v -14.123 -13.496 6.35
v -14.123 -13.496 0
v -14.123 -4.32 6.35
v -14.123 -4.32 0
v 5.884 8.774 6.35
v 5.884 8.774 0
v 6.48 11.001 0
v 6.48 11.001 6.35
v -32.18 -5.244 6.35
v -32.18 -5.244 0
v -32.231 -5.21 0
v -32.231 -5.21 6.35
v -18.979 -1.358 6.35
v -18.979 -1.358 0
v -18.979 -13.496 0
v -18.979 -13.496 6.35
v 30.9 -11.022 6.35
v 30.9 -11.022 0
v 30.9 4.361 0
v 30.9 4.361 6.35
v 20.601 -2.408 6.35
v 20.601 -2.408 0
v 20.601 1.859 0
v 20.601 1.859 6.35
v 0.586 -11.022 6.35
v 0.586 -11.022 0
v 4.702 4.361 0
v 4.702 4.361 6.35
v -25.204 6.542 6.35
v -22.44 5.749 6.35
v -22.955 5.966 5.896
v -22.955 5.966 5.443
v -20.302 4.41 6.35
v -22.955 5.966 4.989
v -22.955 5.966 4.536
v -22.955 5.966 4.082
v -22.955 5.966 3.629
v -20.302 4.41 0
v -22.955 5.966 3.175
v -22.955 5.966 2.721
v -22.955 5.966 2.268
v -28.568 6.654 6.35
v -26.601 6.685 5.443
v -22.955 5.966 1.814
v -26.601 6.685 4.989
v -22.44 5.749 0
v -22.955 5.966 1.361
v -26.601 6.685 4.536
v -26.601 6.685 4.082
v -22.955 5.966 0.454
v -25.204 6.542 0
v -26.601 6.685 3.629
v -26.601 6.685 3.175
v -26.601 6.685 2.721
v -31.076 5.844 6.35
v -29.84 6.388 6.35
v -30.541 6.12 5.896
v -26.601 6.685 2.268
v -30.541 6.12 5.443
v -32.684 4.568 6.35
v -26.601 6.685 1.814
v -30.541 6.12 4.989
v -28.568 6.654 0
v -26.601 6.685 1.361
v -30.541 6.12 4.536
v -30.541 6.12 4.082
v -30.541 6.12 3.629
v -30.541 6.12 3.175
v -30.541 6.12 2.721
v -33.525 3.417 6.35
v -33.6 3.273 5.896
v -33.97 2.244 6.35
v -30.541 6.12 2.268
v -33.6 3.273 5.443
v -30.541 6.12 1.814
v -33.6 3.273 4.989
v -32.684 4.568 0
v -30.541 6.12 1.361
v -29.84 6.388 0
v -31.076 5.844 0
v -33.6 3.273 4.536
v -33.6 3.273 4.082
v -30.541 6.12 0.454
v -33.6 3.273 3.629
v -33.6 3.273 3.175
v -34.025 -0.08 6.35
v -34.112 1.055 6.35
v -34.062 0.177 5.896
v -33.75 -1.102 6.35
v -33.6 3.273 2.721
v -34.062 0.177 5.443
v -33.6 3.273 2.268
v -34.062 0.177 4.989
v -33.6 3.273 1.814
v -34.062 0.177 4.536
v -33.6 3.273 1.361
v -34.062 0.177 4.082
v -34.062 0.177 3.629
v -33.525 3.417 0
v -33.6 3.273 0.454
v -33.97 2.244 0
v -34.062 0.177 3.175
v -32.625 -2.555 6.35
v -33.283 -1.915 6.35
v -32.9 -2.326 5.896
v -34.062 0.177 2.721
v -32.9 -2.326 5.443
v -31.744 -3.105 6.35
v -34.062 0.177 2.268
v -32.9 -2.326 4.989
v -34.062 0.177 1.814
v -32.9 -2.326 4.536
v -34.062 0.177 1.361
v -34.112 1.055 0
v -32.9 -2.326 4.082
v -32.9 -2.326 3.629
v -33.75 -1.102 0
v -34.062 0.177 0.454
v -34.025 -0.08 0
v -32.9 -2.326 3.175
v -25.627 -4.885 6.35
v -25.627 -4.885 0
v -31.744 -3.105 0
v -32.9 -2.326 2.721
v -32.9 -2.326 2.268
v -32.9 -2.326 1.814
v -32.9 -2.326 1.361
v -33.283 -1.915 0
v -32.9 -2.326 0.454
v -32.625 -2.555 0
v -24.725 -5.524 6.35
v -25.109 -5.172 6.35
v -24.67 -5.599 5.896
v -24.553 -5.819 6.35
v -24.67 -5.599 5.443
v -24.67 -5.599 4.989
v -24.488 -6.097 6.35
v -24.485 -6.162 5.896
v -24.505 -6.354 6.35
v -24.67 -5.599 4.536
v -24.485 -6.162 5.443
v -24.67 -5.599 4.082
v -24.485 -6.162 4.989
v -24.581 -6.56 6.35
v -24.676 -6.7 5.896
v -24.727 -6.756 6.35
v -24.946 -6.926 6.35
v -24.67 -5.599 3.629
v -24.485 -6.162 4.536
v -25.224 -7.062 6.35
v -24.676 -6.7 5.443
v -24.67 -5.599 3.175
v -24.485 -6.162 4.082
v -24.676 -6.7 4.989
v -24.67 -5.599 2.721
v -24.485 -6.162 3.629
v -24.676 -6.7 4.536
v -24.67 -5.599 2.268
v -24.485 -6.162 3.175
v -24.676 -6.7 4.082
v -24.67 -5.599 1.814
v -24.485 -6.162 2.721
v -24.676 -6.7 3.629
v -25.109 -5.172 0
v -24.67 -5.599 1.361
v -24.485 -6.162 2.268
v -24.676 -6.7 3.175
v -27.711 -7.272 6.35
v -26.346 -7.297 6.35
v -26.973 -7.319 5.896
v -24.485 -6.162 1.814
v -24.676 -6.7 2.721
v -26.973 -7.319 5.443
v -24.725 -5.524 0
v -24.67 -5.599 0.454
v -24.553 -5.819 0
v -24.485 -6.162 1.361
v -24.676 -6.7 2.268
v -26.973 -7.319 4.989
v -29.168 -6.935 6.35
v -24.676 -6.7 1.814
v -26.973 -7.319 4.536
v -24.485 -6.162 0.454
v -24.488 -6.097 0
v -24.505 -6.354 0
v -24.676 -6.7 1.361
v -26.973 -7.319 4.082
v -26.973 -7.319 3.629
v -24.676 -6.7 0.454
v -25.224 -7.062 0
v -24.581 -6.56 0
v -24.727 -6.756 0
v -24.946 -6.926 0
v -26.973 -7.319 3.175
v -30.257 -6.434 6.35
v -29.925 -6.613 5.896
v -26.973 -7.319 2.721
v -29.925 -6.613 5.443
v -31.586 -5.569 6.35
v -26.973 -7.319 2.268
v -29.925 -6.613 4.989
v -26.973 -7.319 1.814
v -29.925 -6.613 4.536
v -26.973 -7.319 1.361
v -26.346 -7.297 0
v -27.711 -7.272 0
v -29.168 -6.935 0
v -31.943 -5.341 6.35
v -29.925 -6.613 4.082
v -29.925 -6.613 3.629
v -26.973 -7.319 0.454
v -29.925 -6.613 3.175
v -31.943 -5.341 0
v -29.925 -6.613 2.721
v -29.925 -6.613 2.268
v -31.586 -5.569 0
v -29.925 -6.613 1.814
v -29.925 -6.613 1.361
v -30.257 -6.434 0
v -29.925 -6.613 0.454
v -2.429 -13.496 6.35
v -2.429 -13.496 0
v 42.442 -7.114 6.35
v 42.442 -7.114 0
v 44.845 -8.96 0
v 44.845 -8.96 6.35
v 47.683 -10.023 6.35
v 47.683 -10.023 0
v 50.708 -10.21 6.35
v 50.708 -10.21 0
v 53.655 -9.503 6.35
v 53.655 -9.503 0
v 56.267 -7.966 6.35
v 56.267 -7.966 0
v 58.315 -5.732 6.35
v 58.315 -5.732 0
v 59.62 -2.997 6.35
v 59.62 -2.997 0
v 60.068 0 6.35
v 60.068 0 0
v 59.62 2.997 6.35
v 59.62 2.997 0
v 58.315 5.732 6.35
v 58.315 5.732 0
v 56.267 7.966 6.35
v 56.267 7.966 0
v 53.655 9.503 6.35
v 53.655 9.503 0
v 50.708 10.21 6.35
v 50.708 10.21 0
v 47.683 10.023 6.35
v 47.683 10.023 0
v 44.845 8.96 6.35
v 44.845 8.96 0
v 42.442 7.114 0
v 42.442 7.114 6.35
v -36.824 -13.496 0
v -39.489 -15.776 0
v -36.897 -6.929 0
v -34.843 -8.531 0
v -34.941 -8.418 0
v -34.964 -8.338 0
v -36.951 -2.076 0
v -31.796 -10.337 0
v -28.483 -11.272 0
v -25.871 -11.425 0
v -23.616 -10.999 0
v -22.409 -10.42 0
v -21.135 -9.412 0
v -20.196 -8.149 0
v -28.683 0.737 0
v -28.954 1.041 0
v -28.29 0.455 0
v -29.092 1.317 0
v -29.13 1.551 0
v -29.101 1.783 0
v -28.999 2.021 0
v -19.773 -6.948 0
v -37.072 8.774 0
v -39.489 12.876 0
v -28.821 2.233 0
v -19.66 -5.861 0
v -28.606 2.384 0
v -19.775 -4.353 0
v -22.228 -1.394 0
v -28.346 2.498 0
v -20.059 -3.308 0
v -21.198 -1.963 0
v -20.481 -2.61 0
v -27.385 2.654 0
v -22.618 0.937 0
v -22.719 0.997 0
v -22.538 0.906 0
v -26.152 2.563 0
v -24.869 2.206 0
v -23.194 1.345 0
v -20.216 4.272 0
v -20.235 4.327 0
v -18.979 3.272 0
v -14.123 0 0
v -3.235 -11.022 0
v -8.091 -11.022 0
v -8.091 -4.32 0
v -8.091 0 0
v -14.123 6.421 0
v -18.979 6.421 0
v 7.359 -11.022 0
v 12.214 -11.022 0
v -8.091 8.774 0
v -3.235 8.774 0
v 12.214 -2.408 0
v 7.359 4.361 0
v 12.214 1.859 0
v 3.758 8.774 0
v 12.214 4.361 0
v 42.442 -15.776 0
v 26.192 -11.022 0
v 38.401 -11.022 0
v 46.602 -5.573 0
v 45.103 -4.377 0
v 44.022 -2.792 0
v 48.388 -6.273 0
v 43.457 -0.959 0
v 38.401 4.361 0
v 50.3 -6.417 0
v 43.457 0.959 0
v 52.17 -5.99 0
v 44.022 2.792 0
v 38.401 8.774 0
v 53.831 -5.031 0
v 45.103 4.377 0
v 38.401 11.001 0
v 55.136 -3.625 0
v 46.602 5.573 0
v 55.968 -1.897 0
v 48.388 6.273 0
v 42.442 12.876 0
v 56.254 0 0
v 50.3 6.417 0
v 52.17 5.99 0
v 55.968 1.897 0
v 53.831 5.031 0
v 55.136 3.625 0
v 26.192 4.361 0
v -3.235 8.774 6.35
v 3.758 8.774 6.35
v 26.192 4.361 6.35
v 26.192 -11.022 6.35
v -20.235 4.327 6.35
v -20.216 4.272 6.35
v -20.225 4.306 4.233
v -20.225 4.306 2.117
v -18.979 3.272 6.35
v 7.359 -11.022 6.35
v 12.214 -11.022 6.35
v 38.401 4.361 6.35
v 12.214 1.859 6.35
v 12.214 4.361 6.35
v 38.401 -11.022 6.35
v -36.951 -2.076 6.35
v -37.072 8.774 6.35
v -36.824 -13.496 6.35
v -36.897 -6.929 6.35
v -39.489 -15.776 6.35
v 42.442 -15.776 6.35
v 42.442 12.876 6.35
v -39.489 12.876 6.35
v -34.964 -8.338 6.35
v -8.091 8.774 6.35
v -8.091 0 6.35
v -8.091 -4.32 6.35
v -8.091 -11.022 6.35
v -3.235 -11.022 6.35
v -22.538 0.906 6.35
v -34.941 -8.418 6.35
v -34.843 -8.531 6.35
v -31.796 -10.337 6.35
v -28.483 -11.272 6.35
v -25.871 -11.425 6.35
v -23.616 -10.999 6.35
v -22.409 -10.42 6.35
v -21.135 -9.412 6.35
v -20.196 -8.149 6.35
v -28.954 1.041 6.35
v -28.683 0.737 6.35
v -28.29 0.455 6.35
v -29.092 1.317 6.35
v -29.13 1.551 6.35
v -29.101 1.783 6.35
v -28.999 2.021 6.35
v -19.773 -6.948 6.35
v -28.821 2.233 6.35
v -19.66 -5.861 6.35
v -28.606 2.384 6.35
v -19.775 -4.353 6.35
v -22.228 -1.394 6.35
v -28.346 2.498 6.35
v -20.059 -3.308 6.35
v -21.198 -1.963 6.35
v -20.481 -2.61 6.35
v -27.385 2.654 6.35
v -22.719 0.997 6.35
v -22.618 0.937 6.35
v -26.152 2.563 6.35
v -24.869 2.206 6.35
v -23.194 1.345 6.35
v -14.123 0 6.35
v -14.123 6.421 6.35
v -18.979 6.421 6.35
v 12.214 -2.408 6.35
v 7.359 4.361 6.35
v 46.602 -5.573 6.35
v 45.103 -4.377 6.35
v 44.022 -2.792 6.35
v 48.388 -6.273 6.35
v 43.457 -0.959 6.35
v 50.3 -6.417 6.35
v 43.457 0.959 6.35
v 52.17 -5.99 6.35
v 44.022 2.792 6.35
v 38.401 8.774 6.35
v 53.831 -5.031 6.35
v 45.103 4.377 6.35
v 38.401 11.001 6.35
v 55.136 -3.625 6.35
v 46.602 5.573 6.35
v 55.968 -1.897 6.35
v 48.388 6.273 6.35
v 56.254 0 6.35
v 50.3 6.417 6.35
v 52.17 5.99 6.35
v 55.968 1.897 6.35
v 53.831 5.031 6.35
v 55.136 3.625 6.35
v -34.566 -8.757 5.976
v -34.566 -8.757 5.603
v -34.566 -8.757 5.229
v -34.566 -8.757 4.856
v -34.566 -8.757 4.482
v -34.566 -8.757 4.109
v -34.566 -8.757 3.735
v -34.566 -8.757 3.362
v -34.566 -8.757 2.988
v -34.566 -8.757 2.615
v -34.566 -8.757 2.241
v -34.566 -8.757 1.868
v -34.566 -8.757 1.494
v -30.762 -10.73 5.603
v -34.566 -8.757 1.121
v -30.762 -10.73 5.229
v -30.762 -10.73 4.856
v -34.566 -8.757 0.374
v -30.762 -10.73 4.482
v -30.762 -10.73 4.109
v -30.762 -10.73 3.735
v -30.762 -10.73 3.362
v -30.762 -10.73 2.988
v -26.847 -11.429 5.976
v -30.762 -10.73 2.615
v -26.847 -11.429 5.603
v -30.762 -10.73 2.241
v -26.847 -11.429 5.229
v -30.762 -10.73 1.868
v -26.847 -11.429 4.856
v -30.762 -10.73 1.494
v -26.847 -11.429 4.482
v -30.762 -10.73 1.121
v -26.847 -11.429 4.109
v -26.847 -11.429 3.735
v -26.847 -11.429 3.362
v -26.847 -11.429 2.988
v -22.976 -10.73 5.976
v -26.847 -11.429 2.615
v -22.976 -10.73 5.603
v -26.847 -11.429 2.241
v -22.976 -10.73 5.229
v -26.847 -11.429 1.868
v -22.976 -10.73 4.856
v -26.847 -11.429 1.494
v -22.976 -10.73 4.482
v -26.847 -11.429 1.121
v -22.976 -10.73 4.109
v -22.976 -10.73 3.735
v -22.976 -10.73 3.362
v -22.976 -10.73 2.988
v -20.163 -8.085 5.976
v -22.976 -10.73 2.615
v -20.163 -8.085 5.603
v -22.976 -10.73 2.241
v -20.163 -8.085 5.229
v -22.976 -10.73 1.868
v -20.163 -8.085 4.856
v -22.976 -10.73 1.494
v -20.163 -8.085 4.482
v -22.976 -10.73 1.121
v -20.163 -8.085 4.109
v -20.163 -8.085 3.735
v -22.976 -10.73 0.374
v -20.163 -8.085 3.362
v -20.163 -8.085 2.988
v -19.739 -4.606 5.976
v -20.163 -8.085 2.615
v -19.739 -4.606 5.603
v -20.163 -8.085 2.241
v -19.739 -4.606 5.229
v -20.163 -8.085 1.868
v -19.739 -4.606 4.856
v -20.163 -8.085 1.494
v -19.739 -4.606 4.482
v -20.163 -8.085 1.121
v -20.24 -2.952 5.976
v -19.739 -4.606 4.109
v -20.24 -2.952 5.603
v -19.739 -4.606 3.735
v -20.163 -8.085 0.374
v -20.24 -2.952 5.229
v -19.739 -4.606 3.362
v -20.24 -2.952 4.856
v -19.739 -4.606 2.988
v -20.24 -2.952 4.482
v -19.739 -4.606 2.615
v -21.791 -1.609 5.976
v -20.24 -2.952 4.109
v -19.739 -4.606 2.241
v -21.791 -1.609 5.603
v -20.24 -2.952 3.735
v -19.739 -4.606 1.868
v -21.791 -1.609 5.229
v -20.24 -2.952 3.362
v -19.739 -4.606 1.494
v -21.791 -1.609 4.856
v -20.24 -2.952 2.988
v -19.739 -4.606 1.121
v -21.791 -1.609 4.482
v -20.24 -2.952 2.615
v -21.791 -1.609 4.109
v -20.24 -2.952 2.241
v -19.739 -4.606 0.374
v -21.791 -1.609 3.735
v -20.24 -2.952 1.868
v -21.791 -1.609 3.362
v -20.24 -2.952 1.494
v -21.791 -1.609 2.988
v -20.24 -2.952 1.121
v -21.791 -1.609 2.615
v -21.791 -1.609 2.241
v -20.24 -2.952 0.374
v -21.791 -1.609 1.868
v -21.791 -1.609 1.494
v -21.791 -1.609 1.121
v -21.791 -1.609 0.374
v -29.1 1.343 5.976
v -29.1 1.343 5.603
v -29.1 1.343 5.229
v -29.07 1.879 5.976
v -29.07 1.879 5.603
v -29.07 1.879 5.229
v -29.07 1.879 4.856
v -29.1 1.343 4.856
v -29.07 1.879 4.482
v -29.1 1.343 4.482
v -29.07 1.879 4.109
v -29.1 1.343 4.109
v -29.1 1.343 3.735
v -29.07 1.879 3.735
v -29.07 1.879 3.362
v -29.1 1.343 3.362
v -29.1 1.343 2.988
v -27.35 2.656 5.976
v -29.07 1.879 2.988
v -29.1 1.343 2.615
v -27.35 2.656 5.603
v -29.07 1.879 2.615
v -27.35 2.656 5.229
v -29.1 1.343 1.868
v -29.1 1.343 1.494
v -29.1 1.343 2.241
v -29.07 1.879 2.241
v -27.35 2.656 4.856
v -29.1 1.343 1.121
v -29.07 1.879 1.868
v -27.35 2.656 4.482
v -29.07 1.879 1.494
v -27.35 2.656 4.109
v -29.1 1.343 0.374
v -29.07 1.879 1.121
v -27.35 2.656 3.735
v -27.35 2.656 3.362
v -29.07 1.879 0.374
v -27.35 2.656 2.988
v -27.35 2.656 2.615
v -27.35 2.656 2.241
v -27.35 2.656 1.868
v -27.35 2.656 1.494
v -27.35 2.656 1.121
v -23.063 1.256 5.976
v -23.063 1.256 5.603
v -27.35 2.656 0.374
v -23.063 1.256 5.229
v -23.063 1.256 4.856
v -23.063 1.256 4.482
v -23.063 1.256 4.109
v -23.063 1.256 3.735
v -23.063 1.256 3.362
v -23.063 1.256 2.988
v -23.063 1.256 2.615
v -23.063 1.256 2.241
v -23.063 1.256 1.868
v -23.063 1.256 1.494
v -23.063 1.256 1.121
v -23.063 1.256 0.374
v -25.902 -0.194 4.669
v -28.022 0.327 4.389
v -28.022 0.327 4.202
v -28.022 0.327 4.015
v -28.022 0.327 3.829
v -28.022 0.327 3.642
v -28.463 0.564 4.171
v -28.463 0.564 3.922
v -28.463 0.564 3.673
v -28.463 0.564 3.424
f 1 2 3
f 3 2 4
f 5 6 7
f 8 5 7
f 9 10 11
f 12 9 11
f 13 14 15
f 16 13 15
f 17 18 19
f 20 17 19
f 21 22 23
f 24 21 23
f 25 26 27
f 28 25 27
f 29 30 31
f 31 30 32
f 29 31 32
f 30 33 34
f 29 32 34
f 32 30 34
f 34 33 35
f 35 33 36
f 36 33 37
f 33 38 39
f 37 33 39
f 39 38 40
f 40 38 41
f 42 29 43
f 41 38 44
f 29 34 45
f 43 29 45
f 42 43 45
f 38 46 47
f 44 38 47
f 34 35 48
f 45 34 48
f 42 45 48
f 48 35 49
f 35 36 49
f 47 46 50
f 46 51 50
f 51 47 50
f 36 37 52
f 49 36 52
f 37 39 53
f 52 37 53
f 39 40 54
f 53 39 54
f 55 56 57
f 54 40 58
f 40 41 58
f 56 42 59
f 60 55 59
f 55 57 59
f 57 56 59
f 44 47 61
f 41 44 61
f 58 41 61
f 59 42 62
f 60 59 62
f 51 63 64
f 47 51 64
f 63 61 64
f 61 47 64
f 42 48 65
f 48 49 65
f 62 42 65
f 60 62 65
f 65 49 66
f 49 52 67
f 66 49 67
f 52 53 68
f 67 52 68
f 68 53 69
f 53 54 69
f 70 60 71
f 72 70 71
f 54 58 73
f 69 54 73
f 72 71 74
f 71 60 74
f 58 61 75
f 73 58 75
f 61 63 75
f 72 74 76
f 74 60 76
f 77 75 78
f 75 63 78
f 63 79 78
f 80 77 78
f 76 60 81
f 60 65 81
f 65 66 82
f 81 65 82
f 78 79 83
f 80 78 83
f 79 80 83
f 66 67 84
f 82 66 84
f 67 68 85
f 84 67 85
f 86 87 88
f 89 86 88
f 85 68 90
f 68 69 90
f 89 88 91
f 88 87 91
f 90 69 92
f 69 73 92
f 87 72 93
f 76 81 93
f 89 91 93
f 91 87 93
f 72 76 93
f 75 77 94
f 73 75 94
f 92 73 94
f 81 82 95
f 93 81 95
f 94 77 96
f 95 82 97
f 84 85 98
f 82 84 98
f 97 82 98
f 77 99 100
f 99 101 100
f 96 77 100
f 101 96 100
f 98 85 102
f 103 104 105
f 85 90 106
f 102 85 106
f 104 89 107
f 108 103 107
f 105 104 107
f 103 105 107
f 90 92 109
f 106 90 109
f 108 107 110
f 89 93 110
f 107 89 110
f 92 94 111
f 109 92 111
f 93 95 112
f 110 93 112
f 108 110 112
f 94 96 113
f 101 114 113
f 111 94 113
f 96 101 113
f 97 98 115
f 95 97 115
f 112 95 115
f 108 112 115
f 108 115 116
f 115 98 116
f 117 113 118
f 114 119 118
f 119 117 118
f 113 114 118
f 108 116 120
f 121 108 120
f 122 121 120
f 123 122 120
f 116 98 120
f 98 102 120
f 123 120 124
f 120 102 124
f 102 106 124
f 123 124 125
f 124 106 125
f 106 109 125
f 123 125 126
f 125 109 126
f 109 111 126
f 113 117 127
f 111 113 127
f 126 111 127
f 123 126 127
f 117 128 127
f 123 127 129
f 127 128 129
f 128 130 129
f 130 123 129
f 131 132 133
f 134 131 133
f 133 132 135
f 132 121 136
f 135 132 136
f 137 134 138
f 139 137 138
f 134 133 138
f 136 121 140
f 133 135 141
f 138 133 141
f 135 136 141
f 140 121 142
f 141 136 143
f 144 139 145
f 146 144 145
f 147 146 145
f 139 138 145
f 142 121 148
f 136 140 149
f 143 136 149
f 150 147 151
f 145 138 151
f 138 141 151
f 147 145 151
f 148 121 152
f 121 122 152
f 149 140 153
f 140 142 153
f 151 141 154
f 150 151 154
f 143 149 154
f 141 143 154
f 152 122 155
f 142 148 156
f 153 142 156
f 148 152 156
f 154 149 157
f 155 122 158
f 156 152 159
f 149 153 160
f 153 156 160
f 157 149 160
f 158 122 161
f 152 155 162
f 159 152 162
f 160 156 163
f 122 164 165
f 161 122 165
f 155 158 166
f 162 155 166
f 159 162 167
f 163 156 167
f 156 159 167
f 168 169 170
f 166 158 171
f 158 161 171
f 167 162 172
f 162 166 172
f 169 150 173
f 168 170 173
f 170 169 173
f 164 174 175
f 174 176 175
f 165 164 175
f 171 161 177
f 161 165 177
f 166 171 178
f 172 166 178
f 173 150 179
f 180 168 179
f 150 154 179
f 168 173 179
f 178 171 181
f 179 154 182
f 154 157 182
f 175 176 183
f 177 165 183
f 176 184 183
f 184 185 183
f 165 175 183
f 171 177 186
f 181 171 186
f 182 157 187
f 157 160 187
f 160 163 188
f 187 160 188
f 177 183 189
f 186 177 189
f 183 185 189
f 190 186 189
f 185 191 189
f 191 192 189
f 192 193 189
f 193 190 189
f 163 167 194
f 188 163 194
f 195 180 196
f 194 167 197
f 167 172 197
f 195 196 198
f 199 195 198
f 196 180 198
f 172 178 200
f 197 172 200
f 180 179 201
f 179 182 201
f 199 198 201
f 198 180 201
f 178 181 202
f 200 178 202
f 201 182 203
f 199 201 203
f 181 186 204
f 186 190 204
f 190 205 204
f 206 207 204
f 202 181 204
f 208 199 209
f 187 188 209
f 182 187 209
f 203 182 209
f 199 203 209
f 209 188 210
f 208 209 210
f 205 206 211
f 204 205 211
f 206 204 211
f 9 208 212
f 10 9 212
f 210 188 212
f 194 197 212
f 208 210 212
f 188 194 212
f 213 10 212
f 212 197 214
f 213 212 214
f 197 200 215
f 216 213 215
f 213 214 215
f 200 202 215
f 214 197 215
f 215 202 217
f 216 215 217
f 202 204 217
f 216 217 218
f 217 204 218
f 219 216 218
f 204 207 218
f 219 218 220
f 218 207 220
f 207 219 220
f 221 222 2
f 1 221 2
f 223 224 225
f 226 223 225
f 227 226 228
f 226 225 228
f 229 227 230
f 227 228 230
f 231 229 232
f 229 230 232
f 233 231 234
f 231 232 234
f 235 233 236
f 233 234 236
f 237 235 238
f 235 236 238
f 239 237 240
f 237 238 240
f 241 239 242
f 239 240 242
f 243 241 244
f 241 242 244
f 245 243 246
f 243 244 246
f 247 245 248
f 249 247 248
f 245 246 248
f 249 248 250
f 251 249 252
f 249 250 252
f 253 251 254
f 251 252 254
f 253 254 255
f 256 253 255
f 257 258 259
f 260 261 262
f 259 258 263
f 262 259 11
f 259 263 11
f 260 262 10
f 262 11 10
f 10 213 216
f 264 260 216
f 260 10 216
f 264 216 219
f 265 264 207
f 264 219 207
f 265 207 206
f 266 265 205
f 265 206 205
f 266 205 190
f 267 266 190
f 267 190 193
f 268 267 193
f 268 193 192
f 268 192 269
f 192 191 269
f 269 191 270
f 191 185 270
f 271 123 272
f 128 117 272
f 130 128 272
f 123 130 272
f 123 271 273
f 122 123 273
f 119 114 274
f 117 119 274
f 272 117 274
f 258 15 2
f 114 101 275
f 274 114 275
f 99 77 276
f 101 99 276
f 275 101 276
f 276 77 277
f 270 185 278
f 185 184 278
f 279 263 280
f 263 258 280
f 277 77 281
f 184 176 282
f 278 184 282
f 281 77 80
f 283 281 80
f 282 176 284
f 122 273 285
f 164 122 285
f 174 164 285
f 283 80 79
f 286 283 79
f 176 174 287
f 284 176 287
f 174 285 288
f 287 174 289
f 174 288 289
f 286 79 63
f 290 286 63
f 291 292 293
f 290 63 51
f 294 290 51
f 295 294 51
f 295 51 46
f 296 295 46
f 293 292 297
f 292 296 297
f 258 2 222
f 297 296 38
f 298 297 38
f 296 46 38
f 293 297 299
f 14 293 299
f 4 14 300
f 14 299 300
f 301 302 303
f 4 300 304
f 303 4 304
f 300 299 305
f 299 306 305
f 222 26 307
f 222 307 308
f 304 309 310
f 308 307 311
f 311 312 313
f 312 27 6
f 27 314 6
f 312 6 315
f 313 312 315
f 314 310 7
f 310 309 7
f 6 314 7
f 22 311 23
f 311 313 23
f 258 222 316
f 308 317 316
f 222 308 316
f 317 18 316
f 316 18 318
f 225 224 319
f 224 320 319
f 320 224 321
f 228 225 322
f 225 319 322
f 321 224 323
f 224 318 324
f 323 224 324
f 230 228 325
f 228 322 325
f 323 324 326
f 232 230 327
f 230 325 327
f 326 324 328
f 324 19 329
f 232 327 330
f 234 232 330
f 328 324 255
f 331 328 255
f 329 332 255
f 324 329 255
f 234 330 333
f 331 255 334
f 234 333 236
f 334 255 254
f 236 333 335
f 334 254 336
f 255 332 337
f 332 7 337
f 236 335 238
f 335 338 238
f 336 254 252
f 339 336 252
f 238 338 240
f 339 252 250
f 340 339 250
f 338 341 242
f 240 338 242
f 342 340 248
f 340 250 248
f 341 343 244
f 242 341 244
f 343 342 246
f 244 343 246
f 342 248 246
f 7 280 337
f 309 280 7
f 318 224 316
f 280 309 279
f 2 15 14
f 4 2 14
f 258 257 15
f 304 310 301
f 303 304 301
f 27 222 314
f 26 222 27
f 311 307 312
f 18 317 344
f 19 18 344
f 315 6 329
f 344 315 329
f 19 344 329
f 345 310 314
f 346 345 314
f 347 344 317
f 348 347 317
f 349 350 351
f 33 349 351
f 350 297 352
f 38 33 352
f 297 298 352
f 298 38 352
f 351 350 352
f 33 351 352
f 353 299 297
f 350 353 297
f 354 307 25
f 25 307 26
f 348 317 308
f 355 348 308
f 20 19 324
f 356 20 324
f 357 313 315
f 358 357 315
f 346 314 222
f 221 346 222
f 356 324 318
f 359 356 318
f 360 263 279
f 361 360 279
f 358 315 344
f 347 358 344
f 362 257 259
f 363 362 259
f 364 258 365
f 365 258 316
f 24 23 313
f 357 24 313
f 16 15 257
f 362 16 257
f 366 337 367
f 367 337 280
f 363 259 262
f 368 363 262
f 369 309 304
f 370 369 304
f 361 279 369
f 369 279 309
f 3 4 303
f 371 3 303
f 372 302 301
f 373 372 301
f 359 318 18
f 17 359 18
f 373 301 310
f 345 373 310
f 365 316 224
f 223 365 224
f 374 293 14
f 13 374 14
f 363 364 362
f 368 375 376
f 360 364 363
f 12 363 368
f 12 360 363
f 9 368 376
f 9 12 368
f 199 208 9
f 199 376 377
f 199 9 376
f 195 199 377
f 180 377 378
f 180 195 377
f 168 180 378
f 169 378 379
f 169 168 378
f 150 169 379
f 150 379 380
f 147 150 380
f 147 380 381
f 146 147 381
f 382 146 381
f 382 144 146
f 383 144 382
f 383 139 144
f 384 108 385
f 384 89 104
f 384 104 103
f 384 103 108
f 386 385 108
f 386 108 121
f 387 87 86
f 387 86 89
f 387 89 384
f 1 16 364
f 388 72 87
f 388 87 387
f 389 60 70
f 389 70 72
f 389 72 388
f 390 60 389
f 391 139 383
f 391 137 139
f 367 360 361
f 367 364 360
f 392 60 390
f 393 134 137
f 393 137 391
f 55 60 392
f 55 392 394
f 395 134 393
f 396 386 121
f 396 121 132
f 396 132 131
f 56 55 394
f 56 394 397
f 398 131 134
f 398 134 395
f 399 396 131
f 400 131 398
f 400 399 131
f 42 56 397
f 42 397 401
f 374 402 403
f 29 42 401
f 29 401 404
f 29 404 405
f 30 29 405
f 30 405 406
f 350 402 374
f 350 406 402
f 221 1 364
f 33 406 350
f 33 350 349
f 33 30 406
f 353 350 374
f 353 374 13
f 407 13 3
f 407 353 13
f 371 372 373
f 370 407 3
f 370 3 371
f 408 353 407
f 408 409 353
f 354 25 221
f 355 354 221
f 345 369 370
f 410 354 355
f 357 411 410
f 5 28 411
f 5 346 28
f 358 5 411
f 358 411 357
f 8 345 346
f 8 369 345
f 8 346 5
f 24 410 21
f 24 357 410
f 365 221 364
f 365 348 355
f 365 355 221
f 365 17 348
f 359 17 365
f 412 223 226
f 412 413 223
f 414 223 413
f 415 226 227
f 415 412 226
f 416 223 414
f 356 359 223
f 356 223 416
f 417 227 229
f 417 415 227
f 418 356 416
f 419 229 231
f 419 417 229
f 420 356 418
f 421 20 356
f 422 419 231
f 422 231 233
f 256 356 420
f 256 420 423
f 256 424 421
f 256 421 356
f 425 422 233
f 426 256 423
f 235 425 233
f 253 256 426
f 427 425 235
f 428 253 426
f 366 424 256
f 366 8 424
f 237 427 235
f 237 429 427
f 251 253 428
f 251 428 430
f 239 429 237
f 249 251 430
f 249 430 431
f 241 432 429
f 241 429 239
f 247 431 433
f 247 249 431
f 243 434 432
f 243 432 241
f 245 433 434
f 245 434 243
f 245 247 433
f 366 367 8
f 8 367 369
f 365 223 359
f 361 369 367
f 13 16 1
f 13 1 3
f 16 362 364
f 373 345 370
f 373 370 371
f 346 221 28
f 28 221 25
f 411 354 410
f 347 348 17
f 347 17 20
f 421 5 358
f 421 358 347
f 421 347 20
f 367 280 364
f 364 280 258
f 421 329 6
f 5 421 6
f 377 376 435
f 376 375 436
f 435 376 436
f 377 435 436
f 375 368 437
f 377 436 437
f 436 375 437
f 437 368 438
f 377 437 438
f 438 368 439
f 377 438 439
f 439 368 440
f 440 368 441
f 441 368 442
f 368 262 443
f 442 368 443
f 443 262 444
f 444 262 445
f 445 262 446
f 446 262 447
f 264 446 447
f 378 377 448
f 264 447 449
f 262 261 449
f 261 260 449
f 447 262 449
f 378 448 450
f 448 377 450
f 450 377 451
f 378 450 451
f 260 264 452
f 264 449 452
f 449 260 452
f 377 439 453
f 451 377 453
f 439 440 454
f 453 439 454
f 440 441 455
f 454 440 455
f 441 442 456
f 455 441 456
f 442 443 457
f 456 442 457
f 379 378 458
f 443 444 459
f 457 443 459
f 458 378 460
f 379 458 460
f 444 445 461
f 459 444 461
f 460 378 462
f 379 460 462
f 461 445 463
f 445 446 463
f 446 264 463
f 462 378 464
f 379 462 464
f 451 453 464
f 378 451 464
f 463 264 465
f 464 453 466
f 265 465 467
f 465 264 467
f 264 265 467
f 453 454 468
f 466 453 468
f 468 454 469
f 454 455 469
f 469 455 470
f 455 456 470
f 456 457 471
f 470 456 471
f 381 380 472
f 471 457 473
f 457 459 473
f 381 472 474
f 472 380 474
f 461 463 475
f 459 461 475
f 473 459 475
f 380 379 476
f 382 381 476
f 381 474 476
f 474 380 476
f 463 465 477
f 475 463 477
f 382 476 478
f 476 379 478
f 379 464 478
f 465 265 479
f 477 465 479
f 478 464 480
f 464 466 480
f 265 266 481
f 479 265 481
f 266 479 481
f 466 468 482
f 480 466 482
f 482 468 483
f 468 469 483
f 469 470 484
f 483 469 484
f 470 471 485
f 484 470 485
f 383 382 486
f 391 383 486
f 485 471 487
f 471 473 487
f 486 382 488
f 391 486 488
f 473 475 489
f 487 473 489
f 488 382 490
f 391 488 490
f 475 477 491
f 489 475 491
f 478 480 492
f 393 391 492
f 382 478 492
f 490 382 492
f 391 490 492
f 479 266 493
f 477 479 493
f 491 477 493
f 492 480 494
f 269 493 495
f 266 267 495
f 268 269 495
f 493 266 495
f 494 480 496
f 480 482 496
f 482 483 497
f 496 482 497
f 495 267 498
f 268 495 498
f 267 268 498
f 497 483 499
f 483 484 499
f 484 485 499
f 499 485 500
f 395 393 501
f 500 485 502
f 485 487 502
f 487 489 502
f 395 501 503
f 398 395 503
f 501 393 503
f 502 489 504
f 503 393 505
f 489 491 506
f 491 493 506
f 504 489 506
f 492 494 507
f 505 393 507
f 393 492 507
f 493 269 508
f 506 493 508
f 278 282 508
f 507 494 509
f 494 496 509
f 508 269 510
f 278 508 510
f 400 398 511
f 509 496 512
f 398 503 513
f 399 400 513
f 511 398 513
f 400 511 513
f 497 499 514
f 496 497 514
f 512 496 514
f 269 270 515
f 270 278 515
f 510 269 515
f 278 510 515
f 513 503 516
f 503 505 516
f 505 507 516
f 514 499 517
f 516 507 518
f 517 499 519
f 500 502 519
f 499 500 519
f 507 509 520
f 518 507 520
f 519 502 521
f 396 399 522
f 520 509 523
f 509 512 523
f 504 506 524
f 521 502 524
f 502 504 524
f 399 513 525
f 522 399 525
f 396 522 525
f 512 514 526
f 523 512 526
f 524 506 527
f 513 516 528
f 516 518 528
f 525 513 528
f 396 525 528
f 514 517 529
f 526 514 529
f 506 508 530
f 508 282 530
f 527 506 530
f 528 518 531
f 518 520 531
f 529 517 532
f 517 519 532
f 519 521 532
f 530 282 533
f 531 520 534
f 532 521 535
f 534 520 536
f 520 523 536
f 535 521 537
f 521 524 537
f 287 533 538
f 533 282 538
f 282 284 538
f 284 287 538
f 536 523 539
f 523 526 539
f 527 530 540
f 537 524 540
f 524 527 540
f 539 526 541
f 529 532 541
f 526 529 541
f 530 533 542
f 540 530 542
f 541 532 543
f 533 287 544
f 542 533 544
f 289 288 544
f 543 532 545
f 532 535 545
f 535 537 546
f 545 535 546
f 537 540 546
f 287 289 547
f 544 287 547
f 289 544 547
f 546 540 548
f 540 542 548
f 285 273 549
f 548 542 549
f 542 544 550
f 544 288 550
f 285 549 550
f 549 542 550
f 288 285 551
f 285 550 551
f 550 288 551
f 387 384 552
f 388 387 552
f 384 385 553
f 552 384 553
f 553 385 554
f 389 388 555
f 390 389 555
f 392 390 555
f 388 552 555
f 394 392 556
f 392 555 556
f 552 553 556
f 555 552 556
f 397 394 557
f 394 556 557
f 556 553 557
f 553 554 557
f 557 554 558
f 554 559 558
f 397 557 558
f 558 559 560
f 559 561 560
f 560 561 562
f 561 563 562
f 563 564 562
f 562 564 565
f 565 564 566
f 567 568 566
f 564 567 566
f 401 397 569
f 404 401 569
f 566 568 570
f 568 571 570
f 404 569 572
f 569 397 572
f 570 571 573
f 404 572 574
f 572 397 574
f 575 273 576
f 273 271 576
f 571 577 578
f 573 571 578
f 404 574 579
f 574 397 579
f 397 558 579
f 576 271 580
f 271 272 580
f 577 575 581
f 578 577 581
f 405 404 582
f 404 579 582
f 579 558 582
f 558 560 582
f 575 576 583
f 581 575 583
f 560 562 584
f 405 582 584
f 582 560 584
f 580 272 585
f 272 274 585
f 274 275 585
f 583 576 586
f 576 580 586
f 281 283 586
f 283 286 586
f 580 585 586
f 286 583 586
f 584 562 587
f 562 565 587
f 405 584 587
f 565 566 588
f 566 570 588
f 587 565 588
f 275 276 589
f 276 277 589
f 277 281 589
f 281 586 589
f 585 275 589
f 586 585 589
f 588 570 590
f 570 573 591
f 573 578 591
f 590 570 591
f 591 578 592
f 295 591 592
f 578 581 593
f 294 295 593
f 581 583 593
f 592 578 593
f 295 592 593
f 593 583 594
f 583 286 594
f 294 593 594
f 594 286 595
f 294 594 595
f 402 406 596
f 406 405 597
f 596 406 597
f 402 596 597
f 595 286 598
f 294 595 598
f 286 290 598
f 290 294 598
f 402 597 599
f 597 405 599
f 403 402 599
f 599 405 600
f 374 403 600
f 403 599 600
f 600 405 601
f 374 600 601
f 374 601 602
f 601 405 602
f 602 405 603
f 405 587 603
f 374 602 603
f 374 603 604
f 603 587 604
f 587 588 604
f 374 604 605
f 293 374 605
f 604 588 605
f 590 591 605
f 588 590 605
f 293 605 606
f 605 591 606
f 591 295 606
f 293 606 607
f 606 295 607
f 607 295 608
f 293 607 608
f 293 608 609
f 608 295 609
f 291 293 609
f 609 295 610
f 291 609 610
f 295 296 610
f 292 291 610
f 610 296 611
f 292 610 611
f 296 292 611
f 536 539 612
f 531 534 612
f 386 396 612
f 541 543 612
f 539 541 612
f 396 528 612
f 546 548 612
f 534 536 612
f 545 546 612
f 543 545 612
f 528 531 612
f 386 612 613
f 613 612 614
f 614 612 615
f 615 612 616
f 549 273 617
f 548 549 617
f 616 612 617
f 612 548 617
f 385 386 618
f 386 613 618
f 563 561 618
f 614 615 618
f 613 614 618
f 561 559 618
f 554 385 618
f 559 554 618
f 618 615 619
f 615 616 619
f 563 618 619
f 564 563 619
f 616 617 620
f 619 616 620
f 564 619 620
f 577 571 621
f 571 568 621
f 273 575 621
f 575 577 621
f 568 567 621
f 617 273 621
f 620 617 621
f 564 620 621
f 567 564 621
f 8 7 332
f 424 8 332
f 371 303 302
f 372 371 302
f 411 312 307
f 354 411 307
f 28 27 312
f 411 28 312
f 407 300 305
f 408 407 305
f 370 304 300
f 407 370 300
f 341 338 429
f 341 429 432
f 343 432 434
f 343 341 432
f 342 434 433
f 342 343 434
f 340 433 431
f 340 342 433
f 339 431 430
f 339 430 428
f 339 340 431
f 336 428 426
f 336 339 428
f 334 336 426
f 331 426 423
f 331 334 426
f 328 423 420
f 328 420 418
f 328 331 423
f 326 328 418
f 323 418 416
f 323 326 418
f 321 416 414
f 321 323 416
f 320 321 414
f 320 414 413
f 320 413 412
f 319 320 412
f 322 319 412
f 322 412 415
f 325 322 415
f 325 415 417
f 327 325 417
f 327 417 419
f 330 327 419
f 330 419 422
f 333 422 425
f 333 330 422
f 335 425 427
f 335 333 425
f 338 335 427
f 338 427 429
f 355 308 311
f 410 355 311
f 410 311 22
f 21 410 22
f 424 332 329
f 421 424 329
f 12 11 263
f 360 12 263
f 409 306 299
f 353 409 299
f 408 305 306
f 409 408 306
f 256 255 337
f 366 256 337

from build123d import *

# Parameters (mm, degrees)
F0_R     = 6.4346653904
F1_DEPTH = 6.35


with BuildPart() as f1:
    # F0 (on Top) → F1 (new body)
    with BuildSketch(Plane.XY):
        with BuildLine():
            Line((42.4421280622, 12.8763979301), (39.4888482988, 12.8763979301))
            Line((39.4888482988, 12.8763979301), (-39.4888482988, 12.8763979301))
            Line((-39.4888482988, 12.8763979301), (-39.4888482988, -12.8763979301))
            Line((-39.4888482988, -12.8763979301), (-39.4888482988, -15.7759096473))
            Line((-39.4888482988, -15.7759096473), (42.4421280622, -15.7759096473))
            Line((42.4421280622, -15.7759096473), (42.4421280622, -7.1135064169))
            ThreePointArc((42.4421280622, -7.1135064169), (60.0677187775, 0), (42.4421280622, 7.1135064169))
            Line((42.4421280622, 7.1135064169), (42.4421280622, 12.8763979301))
        make_face()
        with BuildLine():
            Line((-36.9513516024, -2.0756540524), (-37.0719090537, 8.7742841496))
            Line((-37.0719090537, 8.7742841496), (-8.0906844199, 8.7742841496))
            Line((-8.0906844199, 8.7742841496), (-8.0906844199, 6.4205448143))
            Line((-8.0906844199, 6.4205448143), (-8.0906844199, 0))
            Line((-8.0906844199, 0), (-14.1232470879, 0))
            Line((-14.1232470879, 0), (-14.1232470879, 6.4205448143))
            Line((-14.1232470879, 6.4205448143), (-18.9787298441, 6.4205448143))
            Line((-18.9787298441, 6.4205448143), (-18.9787298441, 3.272225149))
            Line((-18.9787298441, 3.272225149), (-20.2155560255, 4.2724418454))
            add(Edge.make_bspline(
                [(-22.5384198129, 0.9058159776), (-22.5087632242, 0.9012403563), (-22.4564231627, 1.003636113), (-20.2998909345, 4.1680794182), (-20.2137324503, 4.2468094283), (-20.2155560255, 4.2724418454)],
                knots=[0.9408554446, 0.9408554446, 0.9408554446, 0.9408554446, 0.9475987771, 0.9851160131, 0.9922654541, 0.9922654541, 0.9922654541, 0.9922654541], degree=3))
            Line((-22.5384198129, 0.9058159776), (-18.9787298441, -1.3575867051))
            Line((-18.9787298441, -1.3575867051), (-18.9787298441, -11.0218683258))
            Line((-18.9787298441, -11.0218683258), (-18.9787298441, -13.4963878203))
            Line((-18.9787298441, -13.4963878203), (-36.8244518423, -13.4963878203))
            Line((-36.8244518423, -13.4963878203), (-36.8974223987, -6.9291784173))
            Line((-36.8974223987, -6.9291784173), (-34.963618964, -8.3375107497))
            add(Edge.make_bspline(
                [(-32.2309853918, -5.2103603082), (-32.2342536022, -5.2109736525), (-32.5026233072, -5.2870456733), (-34.8780387985, -8.3306569491), (-34.9598781788, -8.3231927663), (-34.963618964, -8.3375107497)],
                knots=[0.4355467782, 0.4355467782, 0.4355467782, 0.4355467782, 0.4360630295, 0.4746738617, 0.4803443093, 0.4803443093, 0.4803443093, 0.4803443093], degree=3))
            Line((-32.2309853918, -5.2103603082), (-36.9513516024, -2.0756540524))
        make_face(mode=Mode.SUBTRACT)
        Polygon((-3.2352029779, 8.7742841496), (3.757656788, 8.7742841496), (-2.4286360377, -13.4963878203), (-14.1232470879, -13.4963878203), (-14.1232470879, -11.0218693809), (-14.1232470879, -4.3203692259), (-8.0906844199, -4.3203692259), (-8.0906844199, -11.0218693809), (-3.2352029779, -11.0218693809), (-3.2352029779, 6.4205437592), align=None, mode=Mode.SUBTRACT)
        Polygon((7.3585736133, -11.0218693809), (0.585847945, -11.0218693809), (4.7024635713, 4.360642626), (7.3585736133, 4.360642626), (7.3585736133, -8.7344424174), align=None, mode=Mode.SUBTRACT)
        Polygon((26.1919542714, 4.360642626), (26.1919542714, -8.7344424174), (26.1919542714, -11.0218693809), (12.214054124, -11.0218693809), (12.214054124, -8.7344424174), (12.214054124, -2.4076042538), (20.6007964476, -2.4076042538), (20.6007964476, 1.8593341737), (12.214054124, 1.8593341737), (12.214054124, 4.360642626), align=None, mode=Mode.SUBTRACT)
        Polygon((38.4009263977, 4.360642626), (38.4009263977, -11.0218693809), (30.9003021135, -11.0218693809), (30.9003021135, -8.7344424174), (30.9003021135, 4.360642626), (36.1971899434, 4.360642626), align=None, mode=Mode.SUBTRACT)
        with Locations((49.8194545507, 0)):
            Circle(F0_R, mode=Mode.SUBTRACT)
        Polygon((5.8836273277, 8.7742841496), (6.4796276889, 11.001352097), (38.4009263977, 11.001352097), (38.4009263977, 8.7742841496), (36.1971899434, 8.7742841496), (7.3585736133, 8.7742841496), align=None, mode=Mode.SUBTRACT)
        with BuildLine():
            Line((-32.1797840297, -5.244362168), (-32.2309853918, -5.2103603082))
            add(Edge.make_bspline(
                [(-32.2309853918, -5.2103603082), (-32.2342536022, -5.2109736525), (-32.5026233072, -5.2870456733), (-34.8780387985, -8.3306569491), (-34.9598781788, -8.3231927663), (-34.963618964, -8.3375107497)],
                knots=[0.4355467782, 0.4355467782, 0.4355467782, 0.4355467782, 0.4360630295, 0.4746738617, 0.4803443093, 0.4803443093, 0.4803443093, 0.4803443093], degree=3))
            add(Edge.make_bspline(
                [(-34.963618964, -8.3375107497), (-34.9675743656, -8.3526501853), (-34.94912, -8.5187549568), (-33.3696351013, -9.6007944416), (-30.7920969463, -10.8958063848), (-26.8035065017, -11.6393224595), (-22.862499267, -11.1518414802), (-19.5984169566, -8.1691908864), (-19.6017291407, -4.5553773395), (-20.4674273936, -1.5312135148), (-26.7401677603, 0.0475188317), (-28.2464831836, 0.2865770189), (-29.3057058095, 1.2745574964), (-28.9466933204, 2.4241158437), (-27.2521069685, 2.7924557318), (-24.9448859469, 2.3970789833), (-23.0875367983, 1.3142896199), (-22.7543139439, 1.0055321165), (-22.5757111205, 0.9115695355), (-22.5384198129, 0.9058159776)],
                knots=[0.4803443093, 0.4803443093, 0.4803443093, 0.4803443093, 0.4863400822, 0.5112582455, 0.5449682746, 0.5833039505, 0.6212246257, 0.6596699414, 0.6947214559, 0.727122413, 0.774281972, 0.7988549754, 0.8196537682, 0.8379758627, 0.8618457815, 0.8920874529, 0.9196965763, 0.9323761252, 0.9408554446, 0.9408554446, 0.9408554446, 0.9408554446], degree=3))
            add(Edge.make_bspline(
                [(-22.5384198129, 0.9058159776), (-22.5087632242, 0.9012403563), (-22.4564231627, 1.003636113), (-20.2998909345, 4.1680794182), (-20.2137324503, 4.2468094283), (-20.2155560255, 4.2724418454)],
                knots=[0.9408554446, 0.9408554446, 0.9408554446, 0.9408554446, 0.9475987771, 0.9851160131, 0.9922654541, 0.9922654541, 0.9922654541, 0.9922654541], degree=3))
            add(Edge.make_bspline(
                [(-20.2155560255, 4.2724418454), (-20.2175288408, 4.3001720003), (-20.2377762384, 4.3431530092), (-20.3018076718, 4.4104824774)],
                knots=[0.9922654541, 0.9922654541, 0.9922654541, 0.9922654541, 1, 1, 1, 1], degree=3))
            add(Edge.make_bspline(
                [(-20.3018076718, 4.4104824774), (-20.5611843452, 4.6832187345), (-22.7532194208, 6.1902747016), (-26.5857065373, 6.8273013596), (-30.5682744913, 6.6366330017), (-34.0772532991, 3.5349548203), (-34.2377624912, -0.0216028843), (-33.2232441235, -2.6818995712), (-29.0735436506, -4.2584680685), (-25.9931449346, -4.5345033939), (-24.4088698097, -5.5757988745), (-24.4735796107, -6.9657080374), (-26.77069563, -7.515523238), (-29.8441369576, -6.9840985647), (-31.926415002, -5.2512697169), (-32.1542497767, -5.2697193823), (-32.1797840297, -5.244362168)],
                knots=[0, 0, 0, 0, 0.0313308742, 0.0702363738, 0.108023624, 0.1476505721, 0.1824883473, 0.2133365645, 0.2527583853, 0.2871936467, 0.3116497664, 0.3304953042, 0.3577411479, 0.3930772692, 0.4232438974, 0.4310210993, 0.4310210993, 0.4310210993, 0.4310210993], degree=3))
        make_face()
    extrude(amount=F1_DEPTH)


solid = f1.part
